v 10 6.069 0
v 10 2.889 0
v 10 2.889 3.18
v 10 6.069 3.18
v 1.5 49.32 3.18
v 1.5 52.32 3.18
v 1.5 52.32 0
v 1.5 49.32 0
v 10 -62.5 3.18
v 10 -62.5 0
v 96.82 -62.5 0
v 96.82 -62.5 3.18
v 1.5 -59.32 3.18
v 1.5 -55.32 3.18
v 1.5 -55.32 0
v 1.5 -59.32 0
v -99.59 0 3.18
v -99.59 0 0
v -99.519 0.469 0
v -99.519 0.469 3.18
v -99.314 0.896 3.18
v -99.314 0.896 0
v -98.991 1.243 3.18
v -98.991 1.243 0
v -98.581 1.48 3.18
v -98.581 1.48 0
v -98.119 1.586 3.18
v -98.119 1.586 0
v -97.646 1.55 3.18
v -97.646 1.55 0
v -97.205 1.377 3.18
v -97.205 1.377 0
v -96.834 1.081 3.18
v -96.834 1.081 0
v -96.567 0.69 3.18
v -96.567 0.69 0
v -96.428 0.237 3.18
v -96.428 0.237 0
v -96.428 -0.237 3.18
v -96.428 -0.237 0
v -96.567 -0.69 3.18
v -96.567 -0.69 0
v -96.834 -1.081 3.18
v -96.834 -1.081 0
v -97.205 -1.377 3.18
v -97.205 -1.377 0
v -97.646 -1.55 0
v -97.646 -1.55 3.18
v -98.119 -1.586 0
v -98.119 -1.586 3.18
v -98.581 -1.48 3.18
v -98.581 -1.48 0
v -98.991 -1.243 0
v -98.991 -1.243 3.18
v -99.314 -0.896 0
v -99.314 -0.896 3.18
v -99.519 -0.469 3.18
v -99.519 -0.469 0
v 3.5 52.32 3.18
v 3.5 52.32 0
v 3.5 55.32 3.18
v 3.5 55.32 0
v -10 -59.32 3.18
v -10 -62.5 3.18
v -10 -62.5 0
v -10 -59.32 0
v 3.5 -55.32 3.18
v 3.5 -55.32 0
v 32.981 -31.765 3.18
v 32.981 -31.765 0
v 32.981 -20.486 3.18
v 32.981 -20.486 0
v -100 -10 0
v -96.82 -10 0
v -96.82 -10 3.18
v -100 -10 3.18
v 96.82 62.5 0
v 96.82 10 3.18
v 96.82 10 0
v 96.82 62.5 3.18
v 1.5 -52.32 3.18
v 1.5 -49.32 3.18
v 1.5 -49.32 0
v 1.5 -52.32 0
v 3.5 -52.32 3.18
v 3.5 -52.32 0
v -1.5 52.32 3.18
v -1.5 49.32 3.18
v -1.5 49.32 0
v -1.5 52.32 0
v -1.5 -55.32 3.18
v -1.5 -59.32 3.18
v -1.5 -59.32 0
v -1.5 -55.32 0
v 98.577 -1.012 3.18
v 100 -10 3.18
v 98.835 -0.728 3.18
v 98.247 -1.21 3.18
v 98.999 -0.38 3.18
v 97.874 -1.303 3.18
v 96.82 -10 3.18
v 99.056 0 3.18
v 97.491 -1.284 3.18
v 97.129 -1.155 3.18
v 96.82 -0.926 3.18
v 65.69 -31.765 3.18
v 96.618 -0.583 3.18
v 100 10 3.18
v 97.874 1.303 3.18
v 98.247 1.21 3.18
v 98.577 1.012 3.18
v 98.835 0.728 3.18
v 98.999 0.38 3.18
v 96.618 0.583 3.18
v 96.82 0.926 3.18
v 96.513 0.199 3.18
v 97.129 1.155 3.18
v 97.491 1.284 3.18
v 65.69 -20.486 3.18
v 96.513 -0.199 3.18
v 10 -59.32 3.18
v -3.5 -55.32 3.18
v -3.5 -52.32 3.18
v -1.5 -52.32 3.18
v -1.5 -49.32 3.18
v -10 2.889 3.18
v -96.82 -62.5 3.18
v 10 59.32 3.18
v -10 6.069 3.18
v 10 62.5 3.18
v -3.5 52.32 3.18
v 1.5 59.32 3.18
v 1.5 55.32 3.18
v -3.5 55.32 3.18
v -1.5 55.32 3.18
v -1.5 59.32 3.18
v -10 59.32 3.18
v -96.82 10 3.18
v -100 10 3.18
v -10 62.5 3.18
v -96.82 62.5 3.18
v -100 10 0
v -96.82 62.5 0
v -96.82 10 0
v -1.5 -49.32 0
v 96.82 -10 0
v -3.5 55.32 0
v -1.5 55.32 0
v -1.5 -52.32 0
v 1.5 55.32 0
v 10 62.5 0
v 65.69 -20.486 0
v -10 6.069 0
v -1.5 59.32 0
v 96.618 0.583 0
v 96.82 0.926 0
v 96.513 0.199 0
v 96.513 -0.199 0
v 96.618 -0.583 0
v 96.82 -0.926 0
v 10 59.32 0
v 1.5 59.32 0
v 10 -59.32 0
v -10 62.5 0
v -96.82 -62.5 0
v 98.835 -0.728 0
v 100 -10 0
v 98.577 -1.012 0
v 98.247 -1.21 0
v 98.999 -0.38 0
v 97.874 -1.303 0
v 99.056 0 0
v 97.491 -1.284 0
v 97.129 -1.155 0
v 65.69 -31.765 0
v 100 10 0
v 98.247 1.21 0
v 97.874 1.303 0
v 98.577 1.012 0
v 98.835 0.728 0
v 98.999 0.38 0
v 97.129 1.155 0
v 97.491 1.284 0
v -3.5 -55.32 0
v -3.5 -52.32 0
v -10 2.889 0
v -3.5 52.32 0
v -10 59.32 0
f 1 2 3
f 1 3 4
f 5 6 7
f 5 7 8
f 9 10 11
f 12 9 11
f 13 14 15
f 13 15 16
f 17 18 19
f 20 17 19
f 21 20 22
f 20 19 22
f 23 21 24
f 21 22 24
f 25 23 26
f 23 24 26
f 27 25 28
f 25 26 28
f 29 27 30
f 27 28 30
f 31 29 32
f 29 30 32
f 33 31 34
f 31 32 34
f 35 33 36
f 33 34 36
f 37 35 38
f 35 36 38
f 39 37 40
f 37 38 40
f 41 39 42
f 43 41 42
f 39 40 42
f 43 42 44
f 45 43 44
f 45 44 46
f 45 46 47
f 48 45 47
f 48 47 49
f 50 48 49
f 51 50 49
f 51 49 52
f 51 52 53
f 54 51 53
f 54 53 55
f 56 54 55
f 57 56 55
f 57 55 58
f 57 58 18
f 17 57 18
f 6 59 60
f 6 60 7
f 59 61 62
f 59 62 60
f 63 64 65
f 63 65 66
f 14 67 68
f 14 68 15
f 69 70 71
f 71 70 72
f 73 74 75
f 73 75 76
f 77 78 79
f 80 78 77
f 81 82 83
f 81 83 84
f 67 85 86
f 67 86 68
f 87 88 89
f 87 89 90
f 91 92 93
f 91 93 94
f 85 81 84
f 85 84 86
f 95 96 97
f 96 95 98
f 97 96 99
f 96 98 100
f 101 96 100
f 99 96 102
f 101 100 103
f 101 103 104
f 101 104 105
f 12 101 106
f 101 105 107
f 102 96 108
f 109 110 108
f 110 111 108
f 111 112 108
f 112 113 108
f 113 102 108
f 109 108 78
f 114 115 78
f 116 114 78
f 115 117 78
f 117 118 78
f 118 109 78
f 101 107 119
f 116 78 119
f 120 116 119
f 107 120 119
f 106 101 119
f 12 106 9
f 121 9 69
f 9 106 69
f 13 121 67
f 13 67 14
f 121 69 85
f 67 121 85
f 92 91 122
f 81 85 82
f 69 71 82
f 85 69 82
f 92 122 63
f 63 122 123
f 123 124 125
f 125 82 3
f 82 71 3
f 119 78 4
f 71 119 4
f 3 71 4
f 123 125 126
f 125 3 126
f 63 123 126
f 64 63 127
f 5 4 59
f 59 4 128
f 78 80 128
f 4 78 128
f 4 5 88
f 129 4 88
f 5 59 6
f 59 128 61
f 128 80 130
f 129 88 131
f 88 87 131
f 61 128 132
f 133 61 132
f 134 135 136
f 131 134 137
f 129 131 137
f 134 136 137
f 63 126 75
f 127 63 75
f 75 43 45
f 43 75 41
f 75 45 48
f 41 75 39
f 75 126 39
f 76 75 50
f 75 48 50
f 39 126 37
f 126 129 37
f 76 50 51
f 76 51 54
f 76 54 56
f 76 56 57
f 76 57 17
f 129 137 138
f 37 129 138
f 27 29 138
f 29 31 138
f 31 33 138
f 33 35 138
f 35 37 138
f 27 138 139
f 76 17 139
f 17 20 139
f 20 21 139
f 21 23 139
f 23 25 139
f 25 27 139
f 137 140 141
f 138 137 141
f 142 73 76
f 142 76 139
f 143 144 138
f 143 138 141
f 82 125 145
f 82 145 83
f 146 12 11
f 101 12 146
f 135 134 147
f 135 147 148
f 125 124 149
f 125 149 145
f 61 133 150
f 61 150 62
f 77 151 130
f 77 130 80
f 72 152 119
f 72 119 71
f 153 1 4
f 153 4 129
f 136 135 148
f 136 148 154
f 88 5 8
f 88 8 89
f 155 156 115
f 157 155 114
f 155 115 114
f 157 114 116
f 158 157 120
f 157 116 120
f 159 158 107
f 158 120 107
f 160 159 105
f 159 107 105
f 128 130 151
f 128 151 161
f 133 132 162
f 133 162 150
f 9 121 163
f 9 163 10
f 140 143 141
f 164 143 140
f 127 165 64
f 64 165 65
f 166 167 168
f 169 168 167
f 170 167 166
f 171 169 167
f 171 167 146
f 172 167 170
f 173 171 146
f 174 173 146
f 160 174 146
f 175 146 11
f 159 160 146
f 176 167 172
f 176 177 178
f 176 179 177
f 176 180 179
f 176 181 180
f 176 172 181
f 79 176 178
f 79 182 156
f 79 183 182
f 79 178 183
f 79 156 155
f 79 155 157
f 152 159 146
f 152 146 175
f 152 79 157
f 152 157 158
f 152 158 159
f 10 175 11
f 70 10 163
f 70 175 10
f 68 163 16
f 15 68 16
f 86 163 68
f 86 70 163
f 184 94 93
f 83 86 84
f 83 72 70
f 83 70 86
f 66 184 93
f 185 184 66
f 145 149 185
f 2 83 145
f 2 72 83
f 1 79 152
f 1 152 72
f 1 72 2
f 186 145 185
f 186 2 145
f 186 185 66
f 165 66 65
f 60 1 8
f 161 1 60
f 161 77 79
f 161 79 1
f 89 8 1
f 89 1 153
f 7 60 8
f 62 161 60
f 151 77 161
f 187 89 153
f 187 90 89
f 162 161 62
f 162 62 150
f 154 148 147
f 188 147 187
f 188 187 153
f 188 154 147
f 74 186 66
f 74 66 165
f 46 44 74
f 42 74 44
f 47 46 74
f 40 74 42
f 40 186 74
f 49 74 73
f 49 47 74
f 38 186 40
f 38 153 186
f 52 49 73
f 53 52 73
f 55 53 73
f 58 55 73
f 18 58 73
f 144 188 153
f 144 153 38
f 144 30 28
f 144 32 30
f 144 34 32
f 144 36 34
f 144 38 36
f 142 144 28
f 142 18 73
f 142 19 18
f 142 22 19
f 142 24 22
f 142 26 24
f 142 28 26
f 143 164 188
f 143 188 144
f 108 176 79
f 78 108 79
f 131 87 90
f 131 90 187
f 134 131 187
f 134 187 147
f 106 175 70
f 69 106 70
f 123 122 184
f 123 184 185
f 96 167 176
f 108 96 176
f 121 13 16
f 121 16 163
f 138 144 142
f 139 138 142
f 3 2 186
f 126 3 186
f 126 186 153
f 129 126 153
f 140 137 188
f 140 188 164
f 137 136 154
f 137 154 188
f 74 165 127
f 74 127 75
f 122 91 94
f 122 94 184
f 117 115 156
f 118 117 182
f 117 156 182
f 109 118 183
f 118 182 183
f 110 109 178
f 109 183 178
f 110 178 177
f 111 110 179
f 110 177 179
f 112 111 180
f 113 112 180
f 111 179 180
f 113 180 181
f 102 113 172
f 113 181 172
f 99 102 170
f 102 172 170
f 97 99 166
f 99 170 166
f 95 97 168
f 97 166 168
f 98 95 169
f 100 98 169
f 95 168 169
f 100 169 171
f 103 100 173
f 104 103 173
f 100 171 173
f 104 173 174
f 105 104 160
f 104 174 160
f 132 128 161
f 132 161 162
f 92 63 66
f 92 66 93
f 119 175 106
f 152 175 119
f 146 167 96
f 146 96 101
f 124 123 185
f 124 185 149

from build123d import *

# Parameters (mm, degrees)
SKETCH1_W               = 200
SKETCH1_H               = 125
BOSS_EXTRUDE1_DEPTH     = 3.18
SKETCH2_R               = 1.5
SKETCH2_W               = 3.18
SKETCH2_H               = 52.625
CUT_EXTRUDE1_DEPTH      = 4.18
SKETCH6_W               = 20
SKETCH6_H               = 3.18
CUT_EXTRUDE4_DEPTH      = 3.18
SKETCH7_W               = 32.709050062
SKETCH7_H               = 11.279604012
CUT_EXTRUDE5_DEPTH      = 3.18
SKETCH8_W               = 3.18
SKETCH8_H               = 19.75
CUT_EXTRUDE6_DEPTH      = 4.18
SKETCH9_W               = 3.18
SKETCH9_H               = 19.75
CUT_EXTRUDE7_DEPTH      = 4.18
SKETCH11_W              = 3.18
SKETCH11_H              = 20
BOSS_EXTRUDE3_DEPTH     = 3.18
CUT_EXTRUDE9_DEPTH      = 1
CUT_EXTRUDE9_DEPTH_BACK = 4.18
SKETCH13_W              = 3.18
SKETCH13_H              = 20
BOSS_EXTRUDE4_DEPTH     = 3.18
SKETCH14_R              = 1.59
CUT_EXTRUDE12_DEPTH     = 10


with BuildPart() as part:
    # Sketch1 → Boss-Extrude1 (new body)
    with BuildSketch(Plane.XY):
        Rectangle(SKETCH1_W, SKETCH1_H)
    extrude(amount=BOSS_EXTRUDE1_DEPTH)

    # Sketch2 → Cut-Extrude1 (cut, through all)
    with BuildSketch(Plane.XY.offset(3.18)):
        with Locations((-98, 0)):
            Circle(SKETCH2_R)
        with Locations((98, 0)):
            Circle(SKETCH2_R)
        Polygon((-10, 62.5), (10, 62.5), (10, 59.32), (1.5, 59.32), (1.5, 55.32), (3.5, 55.32), (3.5, 52.32), (1.5, 52.32), (1.5, 49.32), (-1.5, 49.32), (-1.5, 52.32), (-3.5, 52.32), (-3.5, 55.32), (-1.5, 55.32), (-1.5, 59.32), (-10, 59.32), align=None)
        Polygon((-10, -62.5), (-10, -59.32), (-1.5, -59.32), (-1.5, -55.32), (-3.5, -55.32), (-3.5, -52.32), (-1.5, -52.32), (-1.5, -49.32), (1.5, -49.32), (1.5, -52.32), (3.5, -52.32), (3.5, -55.32), (1.5, -55.32), (1.5, -59.32), (10, -59.32), (10, -62.5), align=None)
        with Locations((-98.41, 36.1875)):
            Rectangle(SKETCH2_W, SKETCH2_H)
        with Locations((-98.41, -36.1875)):
            Rectangle(SKETCH2_W, SKETCH2_H)
        with Locations((98.41, -36.1875)):
            Rectangle(SKETCH2_W, SKETCH2_H)
        with Locations((98.41, 36.1875)):
            Rectangle(SKETCH2_W, SKETCH2_H)
    extrude(amount=-CUT_EXTRUDE1_DEPTH, mode=Mode.SUBTRACT)

    # Sketch6 → Cut-Extrude4 (cut)
    with BuildSketch(Plane(origin=(0, 0, 0), x_dir=(-1, 0, 0), z_dir=(0, 0, -1))):
        with Locations((0, 4.478818731)):
            Rectangle(SKETCH6_W, SKETCH6_H)
    extrude(amount=-CUT_EXTRUDE4_DEPTH, mode=Mode.SUBTRACT)

    # Sketch7 → Cut-Extrude5 (cut)
    with BuildSketch(Plane(origin=(0, 0, 0), x_dir=(-1, 0, 0), z_dir=(0, 0, -1))):
        with Locations((-49.335490264, -26.125573068)):
            Rectangle(SKETCH7_W, SKETCH7_H)
    extrude(amount=-CUT_EXTRUDE5_DEPTH, mode=Mode.SUBTRACT)

    # Sketch8 → Cut-Extrude6 (cut, through all)
    with BuildSketch(Plane(origin=(0, 0, 0), x_dir=(-1, 0, 0), z_dir=(0, 0, -1))):
        with Locations((98.41, 0)):
            Rectangle(SKETCH8_W, SKETCH8_H)
    extrude(amount=-CUT_EXTRUDE6_DEPTH, mode=Mode.SUBTRACT)

    # Sketch9 → Cut-Extrude7 (cut, through all)
    with BuildSketch(Plane.XY.offset(3.18)):
        with Locations((98.41, 0)):
            Rectangle(SKETCH9_W, SKETCH9_H)
    extrude(amount=-CUT_EXTRUDE7_DEPTH, mode=Mode.SUBTRACT)

    # Sketch11 → Boss-Extrude3 (add, through all)
    with BuildSketch(Plane(origin=(0, 0, 0), x_dir=(-1, 0, 0), z_dir=(0, 0, -1))):
        with Locations((-98.41, 0)):
            Rectangle(SKETCH11_W, SKETCH11_H)
    extrude(amount=-BOSS_EXTRUDE3_DEPTH)

    # Sketch12 → Cut-Extrude9 (cut, two sides)
    with BuildSketch(Plane(origin=(0, 0, 0), x_dir=(-1, 0, 0), z_dir=(0, 0, -1))) as cut_extrude9_sk:
        with BuildLine():
            Line((-96.82, -0.926066952), (-96.82, 0.926066952))
            ThreePointArc((-96.82, 0.926066952), (-99.055723396, 0), (-96.82, -0.926066952))
        make_face()
    extrude(amount=CUT_EXTRUDE9_DEPTH, mode=Mode.SUBTRACT)
    extrude(cut_extrude9_sk.sketch, amount=-CUT_EXTRUDE9_DEPTH_BACK, mode=Mode.SUBTRACT)

    # Sketch13 → Boss-Extrude4 (add, through all)
    with BuildSketch(Plane(origin=(0, 0, 0), x_dir=(-1, 0, 0), z_dir=(0, 0, -1))):
        with Locations((98.41, 0)):
            Rectangle(SKETCH13_W, SKETCH13_H)
    extrude(amount=-BOSS_EXTRUDE4_DEPTH)

    # Sketch14 → Cut-Extrude12 (cut)
    with BuildSketch(Plane(origin=(0, 0, 0), x_dir=(-1, 0, 0), z_dir=(0, 0, -1))):
        with Locations((98, 0)):
            Circle(SKETCH14_R)
    extrude(amount=-CUT_EXTRUDE12_DEPTH, mode=Mode.SUBTRACT)


solid = part.part
